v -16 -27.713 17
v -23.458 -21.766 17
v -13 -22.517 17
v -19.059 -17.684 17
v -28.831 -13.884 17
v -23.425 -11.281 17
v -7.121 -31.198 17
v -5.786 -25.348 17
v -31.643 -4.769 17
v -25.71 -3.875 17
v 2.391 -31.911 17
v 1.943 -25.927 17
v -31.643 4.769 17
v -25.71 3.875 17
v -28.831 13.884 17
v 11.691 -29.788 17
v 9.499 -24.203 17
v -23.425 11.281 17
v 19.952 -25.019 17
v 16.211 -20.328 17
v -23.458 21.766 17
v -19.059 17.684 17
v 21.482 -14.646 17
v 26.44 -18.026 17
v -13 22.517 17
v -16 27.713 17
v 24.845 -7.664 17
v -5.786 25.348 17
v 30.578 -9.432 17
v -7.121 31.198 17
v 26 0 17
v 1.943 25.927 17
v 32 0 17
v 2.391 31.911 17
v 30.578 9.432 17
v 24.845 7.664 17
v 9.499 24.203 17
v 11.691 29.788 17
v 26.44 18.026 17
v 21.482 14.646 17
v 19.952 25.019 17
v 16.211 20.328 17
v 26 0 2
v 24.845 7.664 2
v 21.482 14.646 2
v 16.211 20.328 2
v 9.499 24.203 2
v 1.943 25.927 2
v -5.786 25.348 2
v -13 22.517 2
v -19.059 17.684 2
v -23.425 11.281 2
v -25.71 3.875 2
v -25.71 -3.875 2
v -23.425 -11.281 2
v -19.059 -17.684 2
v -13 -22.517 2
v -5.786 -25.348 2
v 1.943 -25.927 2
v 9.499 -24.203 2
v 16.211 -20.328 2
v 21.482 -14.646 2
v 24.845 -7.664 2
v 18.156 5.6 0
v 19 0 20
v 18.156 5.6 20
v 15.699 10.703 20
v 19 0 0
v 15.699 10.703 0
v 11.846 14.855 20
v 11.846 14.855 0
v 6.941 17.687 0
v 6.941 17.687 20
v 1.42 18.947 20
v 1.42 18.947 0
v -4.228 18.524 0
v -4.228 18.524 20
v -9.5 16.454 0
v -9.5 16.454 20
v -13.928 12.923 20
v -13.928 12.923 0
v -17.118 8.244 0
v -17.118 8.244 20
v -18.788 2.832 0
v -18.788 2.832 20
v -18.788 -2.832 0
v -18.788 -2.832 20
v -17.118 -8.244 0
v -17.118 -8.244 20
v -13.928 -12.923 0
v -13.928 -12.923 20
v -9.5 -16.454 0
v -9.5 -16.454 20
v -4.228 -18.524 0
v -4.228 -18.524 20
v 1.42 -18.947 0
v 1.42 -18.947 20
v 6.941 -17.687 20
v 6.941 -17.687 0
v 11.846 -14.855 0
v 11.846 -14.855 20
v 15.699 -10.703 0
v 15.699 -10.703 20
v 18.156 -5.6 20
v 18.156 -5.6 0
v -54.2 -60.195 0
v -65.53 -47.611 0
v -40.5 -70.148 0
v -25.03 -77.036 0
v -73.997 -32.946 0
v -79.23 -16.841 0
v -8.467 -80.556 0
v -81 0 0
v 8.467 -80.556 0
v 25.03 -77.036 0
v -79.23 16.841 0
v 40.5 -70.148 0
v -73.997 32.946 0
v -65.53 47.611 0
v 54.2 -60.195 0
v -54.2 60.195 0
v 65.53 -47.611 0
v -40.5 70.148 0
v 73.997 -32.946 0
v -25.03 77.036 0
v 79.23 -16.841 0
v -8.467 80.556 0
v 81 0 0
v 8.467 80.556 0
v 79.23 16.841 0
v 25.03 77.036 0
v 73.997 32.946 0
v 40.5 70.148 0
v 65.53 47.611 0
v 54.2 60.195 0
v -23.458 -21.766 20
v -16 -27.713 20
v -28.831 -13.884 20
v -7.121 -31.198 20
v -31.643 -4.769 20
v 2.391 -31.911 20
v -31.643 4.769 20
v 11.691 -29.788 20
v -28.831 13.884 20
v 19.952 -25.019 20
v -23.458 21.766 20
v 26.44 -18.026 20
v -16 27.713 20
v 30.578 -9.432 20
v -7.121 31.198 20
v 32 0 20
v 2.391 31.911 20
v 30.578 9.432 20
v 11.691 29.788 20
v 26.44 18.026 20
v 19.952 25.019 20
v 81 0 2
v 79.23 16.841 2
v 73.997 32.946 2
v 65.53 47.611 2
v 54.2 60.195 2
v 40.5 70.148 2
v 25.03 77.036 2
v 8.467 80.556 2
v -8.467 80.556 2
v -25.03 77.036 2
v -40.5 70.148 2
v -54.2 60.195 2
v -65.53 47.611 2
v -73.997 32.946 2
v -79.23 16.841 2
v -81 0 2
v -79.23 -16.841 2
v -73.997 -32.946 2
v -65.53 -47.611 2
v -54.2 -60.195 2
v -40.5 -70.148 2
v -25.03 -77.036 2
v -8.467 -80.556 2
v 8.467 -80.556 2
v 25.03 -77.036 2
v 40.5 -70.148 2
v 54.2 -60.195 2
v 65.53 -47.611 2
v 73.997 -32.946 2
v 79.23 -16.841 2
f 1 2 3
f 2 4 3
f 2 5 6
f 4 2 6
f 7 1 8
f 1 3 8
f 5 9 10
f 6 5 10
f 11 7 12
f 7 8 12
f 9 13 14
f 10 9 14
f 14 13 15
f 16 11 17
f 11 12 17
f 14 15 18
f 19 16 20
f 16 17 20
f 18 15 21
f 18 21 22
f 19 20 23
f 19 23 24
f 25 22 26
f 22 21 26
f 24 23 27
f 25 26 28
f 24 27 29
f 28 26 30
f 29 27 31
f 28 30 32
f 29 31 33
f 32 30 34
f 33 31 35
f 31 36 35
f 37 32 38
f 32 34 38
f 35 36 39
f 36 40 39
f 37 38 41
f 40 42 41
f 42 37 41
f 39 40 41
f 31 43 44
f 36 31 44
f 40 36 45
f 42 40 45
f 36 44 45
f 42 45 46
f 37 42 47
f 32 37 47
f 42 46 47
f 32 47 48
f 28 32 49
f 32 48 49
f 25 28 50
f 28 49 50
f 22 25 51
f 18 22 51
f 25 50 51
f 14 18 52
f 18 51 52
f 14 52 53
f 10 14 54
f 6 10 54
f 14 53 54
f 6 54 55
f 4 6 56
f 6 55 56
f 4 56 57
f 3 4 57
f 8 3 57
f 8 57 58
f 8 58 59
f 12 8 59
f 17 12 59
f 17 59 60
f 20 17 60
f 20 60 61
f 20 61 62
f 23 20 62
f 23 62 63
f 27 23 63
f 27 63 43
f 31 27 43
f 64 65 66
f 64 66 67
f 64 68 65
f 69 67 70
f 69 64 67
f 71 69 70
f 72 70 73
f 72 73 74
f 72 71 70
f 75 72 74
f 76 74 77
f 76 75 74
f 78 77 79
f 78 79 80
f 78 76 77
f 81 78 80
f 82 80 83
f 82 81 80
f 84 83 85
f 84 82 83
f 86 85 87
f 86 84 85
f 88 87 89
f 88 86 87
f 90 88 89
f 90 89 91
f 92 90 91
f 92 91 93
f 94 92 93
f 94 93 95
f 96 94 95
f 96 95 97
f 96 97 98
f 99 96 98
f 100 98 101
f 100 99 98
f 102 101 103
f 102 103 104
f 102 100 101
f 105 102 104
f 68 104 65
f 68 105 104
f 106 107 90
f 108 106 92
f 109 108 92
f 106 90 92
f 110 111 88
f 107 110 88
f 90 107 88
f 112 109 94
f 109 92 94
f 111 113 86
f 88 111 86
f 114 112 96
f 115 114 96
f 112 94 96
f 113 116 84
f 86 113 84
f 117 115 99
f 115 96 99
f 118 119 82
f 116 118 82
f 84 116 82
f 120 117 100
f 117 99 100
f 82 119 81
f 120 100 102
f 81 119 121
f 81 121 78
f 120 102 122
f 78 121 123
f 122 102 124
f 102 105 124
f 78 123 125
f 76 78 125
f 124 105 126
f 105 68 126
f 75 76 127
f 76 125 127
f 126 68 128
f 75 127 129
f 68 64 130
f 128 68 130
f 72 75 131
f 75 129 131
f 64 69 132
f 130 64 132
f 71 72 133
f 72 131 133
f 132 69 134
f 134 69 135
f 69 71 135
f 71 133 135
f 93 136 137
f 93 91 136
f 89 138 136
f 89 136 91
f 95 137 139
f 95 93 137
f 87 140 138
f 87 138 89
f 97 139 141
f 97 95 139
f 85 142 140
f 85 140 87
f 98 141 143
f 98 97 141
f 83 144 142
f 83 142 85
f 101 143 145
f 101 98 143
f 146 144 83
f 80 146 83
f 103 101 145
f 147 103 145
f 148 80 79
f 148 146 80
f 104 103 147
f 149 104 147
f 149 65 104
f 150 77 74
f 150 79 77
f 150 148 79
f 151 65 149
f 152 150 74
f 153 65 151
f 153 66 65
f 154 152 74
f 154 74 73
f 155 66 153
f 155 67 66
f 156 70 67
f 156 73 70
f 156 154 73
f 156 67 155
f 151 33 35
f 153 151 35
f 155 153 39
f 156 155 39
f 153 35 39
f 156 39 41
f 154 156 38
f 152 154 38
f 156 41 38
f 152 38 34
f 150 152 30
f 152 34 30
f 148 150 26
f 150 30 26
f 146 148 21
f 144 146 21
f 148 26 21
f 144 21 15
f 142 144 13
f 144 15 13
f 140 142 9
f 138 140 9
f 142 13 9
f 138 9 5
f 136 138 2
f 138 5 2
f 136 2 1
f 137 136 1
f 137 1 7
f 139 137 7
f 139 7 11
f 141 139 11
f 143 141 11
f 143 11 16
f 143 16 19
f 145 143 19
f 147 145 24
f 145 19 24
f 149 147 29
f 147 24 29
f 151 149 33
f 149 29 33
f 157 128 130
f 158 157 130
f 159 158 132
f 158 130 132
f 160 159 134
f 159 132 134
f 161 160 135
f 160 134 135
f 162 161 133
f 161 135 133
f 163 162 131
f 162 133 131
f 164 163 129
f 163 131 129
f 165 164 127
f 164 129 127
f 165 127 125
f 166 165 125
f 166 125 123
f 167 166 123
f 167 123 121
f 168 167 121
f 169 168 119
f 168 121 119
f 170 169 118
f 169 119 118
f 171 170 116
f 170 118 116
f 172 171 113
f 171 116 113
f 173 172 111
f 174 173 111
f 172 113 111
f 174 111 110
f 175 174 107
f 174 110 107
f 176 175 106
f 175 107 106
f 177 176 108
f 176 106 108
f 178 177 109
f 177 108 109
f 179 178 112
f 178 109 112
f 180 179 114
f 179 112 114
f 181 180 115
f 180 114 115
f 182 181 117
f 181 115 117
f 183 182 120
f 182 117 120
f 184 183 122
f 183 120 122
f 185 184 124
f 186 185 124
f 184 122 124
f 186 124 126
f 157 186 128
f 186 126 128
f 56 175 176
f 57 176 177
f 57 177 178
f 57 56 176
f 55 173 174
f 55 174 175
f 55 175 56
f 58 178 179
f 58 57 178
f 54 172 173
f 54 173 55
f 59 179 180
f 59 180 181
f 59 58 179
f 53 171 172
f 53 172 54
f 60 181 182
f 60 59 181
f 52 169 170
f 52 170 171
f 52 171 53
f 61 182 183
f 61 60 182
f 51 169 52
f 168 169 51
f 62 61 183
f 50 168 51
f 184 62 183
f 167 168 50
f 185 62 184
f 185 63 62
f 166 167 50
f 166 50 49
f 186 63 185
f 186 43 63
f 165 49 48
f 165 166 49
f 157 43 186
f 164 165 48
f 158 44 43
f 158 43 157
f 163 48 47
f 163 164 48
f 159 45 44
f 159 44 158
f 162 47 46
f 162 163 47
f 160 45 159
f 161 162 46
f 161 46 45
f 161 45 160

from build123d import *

# Parameters (mm, degrees)
SKETCH1_R           = 81
SKETCH1_R_2         = 19
BOSS_EXTRUDE1_DEPTH = 2
SKETCH2_R           = 26
SKETCH2_R_2         = 19
BOSS_EXTRUDE2_DEPTH = 18
BOSS_EXTRUDE3_START = -3
SKETCH3_R           = 32
SKETCH3_R_2         = 26
BOSS_EXTRUDE3_DEPTH = 3


with BuildPart() as part:
    # Sketch1 → Boss-Extrude1 (new body)
    with BuildSketch(Plane.XY):
        Circle(SKETCH1_R)
        Circle(SKETCH1_R_2, mode=Mode.SUBTRACT)
    extrude(amount=BOSS_EXTRUDE1_DEPTH)

    # Sketch2 → Boss-Extrude2 (add)
    with BuildSketch(Plane.XY.offset(2)):
        Circle(SKETCH2_R)
        Circle(SKETCH2_R_2, mode=Mode.SUBTRACT)
    extrude(amount=BOSS_EXTRUDE2_DEPTH)

    # Sketch3 → Boss-Extrude3 (add)
    with BuildSketch(Plane.XY.offset(20).offset(BOSS_EXTRUDE3_START)):
        Circle(SKETCH3_R)
        Circle(SKETCH3_R_2, mode=Mode.SUBTRACT)
    extrude(amount=BOSS_EXTRUDE3_DEPTH)


solid = part.part
